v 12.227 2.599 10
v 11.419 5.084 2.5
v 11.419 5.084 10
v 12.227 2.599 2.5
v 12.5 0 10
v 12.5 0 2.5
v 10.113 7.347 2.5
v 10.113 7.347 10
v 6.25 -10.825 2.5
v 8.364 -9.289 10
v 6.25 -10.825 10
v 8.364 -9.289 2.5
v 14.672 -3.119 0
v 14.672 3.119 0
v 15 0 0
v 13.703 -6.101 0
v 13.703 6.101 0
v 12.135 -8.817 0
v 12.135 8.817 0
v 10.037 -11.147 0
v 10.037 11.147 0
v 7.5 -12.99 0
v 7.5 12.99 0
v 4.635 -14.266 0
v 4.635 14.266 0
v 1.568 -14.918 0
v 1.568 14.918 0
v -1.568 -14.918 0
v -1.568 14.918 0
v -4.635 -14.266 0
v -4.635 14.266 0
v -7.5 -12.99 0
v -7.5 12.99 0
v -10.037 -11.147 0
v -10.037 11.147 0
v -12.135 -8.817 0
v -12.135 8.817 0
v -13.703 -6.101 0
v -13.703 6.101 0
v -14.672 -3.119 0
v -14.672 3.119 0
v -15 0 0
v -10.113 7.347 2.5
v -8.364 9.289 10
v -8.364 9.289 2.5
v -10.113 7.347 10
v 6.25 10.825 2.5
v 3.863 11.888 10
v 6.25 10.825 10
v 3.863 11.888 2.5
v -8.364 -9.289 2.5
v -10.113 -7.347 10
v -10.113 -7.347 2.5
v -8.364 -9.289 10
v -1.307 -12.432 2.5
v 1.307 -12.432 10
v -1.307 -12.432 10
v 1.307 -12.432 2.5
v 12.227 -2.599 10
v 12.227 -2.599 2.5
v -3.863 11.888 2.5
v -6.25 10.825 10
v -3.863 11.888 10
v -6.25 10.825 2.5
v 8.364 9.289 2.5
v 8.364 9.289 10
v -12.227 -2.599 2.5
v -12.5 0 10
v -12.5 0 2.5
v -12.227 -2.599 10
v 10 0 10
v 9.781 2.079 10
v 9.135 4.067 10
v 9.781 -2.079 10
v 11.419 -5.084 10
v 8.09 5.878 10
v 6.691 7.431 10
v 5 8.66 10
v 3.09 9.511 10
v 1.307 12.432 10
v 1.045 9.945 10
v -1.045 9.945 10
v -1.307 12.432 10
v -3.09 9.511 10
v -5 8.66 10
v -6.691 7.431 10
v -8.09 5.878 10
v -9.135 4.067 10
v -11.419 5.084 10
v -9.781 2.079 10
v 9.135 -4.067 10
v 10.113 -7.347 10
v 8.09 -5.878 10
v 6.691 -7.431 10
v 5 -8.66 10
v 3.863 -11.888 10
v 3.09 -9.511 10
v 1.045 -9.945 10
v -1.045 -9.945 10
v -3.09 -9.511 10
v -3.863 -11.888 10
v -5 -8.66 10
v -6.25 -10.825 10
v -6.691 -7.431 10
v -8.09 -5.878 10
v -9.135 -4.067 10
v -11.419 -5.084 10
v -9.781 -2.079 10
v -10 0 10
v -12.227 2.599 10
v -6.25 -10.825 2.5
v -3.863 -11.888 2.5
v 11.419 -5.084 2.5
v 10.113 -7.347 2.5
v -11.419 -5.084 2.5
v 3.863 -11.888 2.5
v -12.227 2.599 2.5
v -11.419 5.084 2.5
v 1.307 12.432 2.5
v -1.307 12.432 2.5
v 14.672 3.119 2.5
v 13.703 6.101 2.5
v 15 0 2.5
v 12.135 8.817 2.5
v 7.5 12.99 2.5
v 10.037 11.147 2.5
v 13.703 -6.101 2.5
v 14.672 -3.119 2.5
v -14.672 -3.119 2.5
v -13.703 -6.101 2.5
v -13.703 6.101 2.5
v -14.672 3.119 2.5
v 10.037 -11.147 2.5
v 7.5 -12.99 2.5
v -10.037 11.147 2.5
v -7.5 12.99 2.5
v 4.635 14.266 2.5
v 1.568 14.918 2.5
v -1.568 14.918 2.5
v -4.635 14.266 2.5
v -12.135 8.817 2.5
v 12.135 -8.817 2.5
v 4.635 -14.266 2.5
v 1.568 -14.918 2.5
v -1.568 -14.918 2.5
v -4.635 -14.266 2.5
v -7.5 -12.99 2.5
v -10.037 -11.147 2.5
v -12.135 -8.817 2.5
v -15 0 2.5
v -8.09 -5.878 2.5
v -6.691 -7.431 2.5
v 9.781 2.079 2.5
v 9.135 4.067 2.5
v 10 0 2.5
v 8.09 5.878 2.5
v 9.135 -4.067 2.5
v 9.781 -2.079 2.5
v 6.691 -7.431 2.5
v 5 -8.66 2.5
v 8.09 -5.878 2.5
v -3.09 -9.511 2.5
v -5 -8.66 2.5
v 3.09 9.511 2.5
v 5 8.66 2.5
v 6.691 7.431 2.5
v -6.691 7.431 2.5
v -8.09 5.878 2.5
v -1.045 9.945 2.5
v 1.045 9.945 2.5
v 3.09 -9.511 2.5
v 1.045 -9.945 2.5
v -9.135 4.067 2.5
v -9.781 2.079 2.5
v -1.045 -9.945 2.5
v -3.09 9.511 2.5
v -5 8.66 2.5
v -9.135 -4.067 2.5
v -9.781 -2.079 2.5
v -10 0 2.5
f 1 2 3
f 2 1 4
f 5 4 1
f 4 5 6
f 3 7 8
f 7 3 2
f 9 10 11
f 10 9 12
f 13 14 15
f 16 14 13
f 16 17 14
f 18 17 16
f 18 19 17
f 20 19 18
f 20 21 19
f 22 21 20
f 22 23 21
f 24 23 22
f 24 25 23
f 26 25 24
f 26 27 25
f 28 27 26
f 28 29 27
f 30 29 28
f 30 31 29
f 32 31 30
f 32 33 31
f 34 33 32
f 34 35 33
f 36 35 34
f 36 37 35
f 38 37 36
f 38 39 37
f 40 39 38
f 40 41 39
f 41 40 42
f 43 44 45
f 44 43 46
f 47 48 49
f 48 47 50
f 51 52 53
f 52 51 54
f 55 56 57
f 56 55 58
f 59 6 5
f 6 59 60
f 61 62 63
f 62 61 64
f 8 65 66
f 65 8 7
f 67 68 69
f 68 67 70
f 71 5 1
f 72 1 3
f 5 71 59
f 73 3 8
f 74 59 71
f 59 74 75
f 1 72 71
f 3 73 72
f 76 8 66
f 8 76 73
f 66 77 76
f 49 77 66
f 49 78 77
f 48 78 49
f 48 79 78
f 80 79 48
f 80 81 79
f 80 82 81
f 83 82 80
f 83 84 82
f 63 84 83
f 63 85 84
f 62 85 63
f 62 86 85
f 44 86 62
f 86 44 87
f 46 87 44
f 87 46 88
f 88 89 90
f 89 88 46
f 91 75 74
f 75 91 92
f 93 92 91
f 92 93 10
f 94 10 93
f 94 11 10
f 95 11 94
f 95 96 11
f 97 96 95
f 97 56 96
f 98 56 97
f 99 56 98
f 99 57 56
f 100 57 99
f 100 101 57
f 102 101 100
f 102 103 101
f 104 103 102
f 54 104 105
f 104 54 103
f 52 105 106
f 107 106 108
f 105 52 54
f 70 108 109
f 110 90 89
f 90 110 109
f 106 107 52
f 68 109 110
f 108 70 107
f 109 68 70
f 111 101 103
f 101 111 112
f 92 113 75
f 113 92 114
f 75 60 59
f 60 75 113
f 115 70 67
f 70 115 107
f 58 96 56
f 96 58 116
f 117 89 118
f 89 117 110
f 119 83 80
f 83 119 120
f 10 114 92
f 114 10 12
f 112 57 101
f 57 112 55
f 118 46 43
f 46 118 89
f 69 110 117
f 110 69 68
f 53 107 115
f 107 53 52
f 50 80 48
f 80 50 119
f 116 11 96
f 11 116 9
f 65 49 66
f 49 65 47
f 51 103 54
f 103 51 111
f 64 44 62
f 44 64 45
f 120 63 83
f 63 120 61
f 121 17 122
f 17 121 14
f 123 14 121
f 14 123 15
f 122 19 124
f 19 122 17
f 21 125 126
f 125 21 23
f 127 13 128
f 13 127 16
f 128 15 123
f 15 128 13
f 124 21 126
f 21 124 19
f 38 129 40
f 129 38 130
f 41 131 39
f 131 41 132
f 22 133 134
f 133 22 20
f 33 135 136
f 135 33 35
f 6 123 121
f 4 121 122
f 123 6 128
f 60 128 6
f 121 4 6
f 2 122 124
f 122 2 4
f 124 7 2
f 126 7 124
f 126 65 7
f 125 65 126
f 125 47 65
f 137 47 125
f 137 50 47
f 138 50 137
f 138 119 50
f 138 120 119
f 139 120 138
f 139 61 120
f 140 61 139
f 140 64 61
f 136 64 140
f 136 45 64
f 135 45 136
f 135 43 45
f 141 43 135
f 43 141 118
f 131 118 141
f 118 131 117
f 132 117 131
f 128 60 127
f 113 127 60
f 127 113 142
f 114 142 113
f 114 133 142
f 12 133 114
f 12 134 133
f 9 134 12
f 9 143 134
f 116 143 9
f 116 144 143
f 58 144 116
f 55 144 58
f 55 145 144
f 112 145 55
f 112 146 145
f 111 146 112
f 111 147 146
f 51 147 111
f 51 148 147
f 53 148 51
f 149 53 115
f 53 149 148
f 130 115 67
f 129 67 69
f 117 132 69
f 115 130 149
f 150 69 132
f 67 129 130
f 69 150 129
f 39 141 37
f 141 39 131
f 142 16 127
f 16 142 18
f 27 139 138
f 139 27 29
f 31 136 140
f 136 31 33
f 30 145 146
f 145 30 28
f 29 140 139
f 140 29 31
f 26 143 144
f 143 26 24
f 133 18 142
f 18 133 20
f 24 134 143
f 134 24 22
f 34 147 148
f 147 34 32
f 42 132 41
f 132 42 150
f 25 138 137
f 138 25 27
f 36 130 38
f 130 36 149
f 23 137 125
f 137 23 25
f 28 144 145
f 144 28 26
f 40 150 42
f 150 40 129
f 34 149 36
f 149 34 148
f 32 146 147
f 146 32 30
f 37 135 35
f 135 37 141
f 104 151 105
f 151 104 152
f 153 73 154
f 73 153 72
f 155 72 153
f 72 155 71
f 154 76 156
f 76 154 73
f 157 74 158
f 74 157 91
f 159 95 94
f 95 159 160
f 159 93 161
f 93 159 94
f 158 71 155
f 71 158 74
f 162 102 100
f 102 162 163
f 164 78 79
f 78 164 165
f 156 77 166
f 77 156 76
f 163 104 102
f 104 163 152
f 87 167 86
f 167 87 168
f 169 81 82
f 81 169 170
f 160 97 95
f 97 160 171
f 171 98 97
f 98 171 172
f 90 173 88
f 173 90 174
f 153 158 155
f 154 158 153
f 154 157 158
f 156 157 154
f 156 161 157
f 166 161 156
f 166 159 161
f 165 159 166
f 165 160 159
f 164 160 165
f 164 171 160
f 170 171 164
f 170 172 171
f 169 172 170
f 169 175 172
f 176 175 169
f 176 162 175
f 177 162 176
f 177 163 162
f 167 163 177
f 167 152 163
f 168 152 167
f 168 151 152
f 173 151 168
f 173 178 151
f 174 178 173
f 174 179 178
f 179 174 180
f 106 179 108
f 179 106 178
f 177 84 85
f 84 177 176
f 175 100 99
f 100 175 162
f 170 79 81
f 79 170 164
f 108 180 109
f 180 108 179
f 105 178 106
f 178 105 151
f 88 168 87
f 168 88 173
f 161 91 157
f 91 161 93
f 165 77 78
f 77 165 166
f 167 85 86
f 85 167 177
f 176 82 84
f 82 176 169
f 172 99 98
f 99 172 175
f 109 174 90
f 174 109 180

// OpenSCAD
// Customizable circular device foot
// Created by Kjell Kernen
// Date 14.1.2017

/*[Foot Parameters]*/

// of the foot in tens of mm:
diameter=250;      // [50:500]

// of the foot in tens of mm:
total_height=100;       // [25:1000]

// of the foot in tens of mm:
flange_height=25;// [0:50]

// of the foot in tens of mm:
flange_width=25;// [0:50]

/*[Hidden]*/


difference()
{
        union()
        {
            cylinder(r=(diameter/20), h=total_height/10);	
            cylinder(r=((diameter + (flange_width*2))/20), h=flange_height/10);	
        }
        translate([0,0,flange_height/10])
            cylinder(r=((diameter-50)/20), h=(total_height/10) + 2);	
}
